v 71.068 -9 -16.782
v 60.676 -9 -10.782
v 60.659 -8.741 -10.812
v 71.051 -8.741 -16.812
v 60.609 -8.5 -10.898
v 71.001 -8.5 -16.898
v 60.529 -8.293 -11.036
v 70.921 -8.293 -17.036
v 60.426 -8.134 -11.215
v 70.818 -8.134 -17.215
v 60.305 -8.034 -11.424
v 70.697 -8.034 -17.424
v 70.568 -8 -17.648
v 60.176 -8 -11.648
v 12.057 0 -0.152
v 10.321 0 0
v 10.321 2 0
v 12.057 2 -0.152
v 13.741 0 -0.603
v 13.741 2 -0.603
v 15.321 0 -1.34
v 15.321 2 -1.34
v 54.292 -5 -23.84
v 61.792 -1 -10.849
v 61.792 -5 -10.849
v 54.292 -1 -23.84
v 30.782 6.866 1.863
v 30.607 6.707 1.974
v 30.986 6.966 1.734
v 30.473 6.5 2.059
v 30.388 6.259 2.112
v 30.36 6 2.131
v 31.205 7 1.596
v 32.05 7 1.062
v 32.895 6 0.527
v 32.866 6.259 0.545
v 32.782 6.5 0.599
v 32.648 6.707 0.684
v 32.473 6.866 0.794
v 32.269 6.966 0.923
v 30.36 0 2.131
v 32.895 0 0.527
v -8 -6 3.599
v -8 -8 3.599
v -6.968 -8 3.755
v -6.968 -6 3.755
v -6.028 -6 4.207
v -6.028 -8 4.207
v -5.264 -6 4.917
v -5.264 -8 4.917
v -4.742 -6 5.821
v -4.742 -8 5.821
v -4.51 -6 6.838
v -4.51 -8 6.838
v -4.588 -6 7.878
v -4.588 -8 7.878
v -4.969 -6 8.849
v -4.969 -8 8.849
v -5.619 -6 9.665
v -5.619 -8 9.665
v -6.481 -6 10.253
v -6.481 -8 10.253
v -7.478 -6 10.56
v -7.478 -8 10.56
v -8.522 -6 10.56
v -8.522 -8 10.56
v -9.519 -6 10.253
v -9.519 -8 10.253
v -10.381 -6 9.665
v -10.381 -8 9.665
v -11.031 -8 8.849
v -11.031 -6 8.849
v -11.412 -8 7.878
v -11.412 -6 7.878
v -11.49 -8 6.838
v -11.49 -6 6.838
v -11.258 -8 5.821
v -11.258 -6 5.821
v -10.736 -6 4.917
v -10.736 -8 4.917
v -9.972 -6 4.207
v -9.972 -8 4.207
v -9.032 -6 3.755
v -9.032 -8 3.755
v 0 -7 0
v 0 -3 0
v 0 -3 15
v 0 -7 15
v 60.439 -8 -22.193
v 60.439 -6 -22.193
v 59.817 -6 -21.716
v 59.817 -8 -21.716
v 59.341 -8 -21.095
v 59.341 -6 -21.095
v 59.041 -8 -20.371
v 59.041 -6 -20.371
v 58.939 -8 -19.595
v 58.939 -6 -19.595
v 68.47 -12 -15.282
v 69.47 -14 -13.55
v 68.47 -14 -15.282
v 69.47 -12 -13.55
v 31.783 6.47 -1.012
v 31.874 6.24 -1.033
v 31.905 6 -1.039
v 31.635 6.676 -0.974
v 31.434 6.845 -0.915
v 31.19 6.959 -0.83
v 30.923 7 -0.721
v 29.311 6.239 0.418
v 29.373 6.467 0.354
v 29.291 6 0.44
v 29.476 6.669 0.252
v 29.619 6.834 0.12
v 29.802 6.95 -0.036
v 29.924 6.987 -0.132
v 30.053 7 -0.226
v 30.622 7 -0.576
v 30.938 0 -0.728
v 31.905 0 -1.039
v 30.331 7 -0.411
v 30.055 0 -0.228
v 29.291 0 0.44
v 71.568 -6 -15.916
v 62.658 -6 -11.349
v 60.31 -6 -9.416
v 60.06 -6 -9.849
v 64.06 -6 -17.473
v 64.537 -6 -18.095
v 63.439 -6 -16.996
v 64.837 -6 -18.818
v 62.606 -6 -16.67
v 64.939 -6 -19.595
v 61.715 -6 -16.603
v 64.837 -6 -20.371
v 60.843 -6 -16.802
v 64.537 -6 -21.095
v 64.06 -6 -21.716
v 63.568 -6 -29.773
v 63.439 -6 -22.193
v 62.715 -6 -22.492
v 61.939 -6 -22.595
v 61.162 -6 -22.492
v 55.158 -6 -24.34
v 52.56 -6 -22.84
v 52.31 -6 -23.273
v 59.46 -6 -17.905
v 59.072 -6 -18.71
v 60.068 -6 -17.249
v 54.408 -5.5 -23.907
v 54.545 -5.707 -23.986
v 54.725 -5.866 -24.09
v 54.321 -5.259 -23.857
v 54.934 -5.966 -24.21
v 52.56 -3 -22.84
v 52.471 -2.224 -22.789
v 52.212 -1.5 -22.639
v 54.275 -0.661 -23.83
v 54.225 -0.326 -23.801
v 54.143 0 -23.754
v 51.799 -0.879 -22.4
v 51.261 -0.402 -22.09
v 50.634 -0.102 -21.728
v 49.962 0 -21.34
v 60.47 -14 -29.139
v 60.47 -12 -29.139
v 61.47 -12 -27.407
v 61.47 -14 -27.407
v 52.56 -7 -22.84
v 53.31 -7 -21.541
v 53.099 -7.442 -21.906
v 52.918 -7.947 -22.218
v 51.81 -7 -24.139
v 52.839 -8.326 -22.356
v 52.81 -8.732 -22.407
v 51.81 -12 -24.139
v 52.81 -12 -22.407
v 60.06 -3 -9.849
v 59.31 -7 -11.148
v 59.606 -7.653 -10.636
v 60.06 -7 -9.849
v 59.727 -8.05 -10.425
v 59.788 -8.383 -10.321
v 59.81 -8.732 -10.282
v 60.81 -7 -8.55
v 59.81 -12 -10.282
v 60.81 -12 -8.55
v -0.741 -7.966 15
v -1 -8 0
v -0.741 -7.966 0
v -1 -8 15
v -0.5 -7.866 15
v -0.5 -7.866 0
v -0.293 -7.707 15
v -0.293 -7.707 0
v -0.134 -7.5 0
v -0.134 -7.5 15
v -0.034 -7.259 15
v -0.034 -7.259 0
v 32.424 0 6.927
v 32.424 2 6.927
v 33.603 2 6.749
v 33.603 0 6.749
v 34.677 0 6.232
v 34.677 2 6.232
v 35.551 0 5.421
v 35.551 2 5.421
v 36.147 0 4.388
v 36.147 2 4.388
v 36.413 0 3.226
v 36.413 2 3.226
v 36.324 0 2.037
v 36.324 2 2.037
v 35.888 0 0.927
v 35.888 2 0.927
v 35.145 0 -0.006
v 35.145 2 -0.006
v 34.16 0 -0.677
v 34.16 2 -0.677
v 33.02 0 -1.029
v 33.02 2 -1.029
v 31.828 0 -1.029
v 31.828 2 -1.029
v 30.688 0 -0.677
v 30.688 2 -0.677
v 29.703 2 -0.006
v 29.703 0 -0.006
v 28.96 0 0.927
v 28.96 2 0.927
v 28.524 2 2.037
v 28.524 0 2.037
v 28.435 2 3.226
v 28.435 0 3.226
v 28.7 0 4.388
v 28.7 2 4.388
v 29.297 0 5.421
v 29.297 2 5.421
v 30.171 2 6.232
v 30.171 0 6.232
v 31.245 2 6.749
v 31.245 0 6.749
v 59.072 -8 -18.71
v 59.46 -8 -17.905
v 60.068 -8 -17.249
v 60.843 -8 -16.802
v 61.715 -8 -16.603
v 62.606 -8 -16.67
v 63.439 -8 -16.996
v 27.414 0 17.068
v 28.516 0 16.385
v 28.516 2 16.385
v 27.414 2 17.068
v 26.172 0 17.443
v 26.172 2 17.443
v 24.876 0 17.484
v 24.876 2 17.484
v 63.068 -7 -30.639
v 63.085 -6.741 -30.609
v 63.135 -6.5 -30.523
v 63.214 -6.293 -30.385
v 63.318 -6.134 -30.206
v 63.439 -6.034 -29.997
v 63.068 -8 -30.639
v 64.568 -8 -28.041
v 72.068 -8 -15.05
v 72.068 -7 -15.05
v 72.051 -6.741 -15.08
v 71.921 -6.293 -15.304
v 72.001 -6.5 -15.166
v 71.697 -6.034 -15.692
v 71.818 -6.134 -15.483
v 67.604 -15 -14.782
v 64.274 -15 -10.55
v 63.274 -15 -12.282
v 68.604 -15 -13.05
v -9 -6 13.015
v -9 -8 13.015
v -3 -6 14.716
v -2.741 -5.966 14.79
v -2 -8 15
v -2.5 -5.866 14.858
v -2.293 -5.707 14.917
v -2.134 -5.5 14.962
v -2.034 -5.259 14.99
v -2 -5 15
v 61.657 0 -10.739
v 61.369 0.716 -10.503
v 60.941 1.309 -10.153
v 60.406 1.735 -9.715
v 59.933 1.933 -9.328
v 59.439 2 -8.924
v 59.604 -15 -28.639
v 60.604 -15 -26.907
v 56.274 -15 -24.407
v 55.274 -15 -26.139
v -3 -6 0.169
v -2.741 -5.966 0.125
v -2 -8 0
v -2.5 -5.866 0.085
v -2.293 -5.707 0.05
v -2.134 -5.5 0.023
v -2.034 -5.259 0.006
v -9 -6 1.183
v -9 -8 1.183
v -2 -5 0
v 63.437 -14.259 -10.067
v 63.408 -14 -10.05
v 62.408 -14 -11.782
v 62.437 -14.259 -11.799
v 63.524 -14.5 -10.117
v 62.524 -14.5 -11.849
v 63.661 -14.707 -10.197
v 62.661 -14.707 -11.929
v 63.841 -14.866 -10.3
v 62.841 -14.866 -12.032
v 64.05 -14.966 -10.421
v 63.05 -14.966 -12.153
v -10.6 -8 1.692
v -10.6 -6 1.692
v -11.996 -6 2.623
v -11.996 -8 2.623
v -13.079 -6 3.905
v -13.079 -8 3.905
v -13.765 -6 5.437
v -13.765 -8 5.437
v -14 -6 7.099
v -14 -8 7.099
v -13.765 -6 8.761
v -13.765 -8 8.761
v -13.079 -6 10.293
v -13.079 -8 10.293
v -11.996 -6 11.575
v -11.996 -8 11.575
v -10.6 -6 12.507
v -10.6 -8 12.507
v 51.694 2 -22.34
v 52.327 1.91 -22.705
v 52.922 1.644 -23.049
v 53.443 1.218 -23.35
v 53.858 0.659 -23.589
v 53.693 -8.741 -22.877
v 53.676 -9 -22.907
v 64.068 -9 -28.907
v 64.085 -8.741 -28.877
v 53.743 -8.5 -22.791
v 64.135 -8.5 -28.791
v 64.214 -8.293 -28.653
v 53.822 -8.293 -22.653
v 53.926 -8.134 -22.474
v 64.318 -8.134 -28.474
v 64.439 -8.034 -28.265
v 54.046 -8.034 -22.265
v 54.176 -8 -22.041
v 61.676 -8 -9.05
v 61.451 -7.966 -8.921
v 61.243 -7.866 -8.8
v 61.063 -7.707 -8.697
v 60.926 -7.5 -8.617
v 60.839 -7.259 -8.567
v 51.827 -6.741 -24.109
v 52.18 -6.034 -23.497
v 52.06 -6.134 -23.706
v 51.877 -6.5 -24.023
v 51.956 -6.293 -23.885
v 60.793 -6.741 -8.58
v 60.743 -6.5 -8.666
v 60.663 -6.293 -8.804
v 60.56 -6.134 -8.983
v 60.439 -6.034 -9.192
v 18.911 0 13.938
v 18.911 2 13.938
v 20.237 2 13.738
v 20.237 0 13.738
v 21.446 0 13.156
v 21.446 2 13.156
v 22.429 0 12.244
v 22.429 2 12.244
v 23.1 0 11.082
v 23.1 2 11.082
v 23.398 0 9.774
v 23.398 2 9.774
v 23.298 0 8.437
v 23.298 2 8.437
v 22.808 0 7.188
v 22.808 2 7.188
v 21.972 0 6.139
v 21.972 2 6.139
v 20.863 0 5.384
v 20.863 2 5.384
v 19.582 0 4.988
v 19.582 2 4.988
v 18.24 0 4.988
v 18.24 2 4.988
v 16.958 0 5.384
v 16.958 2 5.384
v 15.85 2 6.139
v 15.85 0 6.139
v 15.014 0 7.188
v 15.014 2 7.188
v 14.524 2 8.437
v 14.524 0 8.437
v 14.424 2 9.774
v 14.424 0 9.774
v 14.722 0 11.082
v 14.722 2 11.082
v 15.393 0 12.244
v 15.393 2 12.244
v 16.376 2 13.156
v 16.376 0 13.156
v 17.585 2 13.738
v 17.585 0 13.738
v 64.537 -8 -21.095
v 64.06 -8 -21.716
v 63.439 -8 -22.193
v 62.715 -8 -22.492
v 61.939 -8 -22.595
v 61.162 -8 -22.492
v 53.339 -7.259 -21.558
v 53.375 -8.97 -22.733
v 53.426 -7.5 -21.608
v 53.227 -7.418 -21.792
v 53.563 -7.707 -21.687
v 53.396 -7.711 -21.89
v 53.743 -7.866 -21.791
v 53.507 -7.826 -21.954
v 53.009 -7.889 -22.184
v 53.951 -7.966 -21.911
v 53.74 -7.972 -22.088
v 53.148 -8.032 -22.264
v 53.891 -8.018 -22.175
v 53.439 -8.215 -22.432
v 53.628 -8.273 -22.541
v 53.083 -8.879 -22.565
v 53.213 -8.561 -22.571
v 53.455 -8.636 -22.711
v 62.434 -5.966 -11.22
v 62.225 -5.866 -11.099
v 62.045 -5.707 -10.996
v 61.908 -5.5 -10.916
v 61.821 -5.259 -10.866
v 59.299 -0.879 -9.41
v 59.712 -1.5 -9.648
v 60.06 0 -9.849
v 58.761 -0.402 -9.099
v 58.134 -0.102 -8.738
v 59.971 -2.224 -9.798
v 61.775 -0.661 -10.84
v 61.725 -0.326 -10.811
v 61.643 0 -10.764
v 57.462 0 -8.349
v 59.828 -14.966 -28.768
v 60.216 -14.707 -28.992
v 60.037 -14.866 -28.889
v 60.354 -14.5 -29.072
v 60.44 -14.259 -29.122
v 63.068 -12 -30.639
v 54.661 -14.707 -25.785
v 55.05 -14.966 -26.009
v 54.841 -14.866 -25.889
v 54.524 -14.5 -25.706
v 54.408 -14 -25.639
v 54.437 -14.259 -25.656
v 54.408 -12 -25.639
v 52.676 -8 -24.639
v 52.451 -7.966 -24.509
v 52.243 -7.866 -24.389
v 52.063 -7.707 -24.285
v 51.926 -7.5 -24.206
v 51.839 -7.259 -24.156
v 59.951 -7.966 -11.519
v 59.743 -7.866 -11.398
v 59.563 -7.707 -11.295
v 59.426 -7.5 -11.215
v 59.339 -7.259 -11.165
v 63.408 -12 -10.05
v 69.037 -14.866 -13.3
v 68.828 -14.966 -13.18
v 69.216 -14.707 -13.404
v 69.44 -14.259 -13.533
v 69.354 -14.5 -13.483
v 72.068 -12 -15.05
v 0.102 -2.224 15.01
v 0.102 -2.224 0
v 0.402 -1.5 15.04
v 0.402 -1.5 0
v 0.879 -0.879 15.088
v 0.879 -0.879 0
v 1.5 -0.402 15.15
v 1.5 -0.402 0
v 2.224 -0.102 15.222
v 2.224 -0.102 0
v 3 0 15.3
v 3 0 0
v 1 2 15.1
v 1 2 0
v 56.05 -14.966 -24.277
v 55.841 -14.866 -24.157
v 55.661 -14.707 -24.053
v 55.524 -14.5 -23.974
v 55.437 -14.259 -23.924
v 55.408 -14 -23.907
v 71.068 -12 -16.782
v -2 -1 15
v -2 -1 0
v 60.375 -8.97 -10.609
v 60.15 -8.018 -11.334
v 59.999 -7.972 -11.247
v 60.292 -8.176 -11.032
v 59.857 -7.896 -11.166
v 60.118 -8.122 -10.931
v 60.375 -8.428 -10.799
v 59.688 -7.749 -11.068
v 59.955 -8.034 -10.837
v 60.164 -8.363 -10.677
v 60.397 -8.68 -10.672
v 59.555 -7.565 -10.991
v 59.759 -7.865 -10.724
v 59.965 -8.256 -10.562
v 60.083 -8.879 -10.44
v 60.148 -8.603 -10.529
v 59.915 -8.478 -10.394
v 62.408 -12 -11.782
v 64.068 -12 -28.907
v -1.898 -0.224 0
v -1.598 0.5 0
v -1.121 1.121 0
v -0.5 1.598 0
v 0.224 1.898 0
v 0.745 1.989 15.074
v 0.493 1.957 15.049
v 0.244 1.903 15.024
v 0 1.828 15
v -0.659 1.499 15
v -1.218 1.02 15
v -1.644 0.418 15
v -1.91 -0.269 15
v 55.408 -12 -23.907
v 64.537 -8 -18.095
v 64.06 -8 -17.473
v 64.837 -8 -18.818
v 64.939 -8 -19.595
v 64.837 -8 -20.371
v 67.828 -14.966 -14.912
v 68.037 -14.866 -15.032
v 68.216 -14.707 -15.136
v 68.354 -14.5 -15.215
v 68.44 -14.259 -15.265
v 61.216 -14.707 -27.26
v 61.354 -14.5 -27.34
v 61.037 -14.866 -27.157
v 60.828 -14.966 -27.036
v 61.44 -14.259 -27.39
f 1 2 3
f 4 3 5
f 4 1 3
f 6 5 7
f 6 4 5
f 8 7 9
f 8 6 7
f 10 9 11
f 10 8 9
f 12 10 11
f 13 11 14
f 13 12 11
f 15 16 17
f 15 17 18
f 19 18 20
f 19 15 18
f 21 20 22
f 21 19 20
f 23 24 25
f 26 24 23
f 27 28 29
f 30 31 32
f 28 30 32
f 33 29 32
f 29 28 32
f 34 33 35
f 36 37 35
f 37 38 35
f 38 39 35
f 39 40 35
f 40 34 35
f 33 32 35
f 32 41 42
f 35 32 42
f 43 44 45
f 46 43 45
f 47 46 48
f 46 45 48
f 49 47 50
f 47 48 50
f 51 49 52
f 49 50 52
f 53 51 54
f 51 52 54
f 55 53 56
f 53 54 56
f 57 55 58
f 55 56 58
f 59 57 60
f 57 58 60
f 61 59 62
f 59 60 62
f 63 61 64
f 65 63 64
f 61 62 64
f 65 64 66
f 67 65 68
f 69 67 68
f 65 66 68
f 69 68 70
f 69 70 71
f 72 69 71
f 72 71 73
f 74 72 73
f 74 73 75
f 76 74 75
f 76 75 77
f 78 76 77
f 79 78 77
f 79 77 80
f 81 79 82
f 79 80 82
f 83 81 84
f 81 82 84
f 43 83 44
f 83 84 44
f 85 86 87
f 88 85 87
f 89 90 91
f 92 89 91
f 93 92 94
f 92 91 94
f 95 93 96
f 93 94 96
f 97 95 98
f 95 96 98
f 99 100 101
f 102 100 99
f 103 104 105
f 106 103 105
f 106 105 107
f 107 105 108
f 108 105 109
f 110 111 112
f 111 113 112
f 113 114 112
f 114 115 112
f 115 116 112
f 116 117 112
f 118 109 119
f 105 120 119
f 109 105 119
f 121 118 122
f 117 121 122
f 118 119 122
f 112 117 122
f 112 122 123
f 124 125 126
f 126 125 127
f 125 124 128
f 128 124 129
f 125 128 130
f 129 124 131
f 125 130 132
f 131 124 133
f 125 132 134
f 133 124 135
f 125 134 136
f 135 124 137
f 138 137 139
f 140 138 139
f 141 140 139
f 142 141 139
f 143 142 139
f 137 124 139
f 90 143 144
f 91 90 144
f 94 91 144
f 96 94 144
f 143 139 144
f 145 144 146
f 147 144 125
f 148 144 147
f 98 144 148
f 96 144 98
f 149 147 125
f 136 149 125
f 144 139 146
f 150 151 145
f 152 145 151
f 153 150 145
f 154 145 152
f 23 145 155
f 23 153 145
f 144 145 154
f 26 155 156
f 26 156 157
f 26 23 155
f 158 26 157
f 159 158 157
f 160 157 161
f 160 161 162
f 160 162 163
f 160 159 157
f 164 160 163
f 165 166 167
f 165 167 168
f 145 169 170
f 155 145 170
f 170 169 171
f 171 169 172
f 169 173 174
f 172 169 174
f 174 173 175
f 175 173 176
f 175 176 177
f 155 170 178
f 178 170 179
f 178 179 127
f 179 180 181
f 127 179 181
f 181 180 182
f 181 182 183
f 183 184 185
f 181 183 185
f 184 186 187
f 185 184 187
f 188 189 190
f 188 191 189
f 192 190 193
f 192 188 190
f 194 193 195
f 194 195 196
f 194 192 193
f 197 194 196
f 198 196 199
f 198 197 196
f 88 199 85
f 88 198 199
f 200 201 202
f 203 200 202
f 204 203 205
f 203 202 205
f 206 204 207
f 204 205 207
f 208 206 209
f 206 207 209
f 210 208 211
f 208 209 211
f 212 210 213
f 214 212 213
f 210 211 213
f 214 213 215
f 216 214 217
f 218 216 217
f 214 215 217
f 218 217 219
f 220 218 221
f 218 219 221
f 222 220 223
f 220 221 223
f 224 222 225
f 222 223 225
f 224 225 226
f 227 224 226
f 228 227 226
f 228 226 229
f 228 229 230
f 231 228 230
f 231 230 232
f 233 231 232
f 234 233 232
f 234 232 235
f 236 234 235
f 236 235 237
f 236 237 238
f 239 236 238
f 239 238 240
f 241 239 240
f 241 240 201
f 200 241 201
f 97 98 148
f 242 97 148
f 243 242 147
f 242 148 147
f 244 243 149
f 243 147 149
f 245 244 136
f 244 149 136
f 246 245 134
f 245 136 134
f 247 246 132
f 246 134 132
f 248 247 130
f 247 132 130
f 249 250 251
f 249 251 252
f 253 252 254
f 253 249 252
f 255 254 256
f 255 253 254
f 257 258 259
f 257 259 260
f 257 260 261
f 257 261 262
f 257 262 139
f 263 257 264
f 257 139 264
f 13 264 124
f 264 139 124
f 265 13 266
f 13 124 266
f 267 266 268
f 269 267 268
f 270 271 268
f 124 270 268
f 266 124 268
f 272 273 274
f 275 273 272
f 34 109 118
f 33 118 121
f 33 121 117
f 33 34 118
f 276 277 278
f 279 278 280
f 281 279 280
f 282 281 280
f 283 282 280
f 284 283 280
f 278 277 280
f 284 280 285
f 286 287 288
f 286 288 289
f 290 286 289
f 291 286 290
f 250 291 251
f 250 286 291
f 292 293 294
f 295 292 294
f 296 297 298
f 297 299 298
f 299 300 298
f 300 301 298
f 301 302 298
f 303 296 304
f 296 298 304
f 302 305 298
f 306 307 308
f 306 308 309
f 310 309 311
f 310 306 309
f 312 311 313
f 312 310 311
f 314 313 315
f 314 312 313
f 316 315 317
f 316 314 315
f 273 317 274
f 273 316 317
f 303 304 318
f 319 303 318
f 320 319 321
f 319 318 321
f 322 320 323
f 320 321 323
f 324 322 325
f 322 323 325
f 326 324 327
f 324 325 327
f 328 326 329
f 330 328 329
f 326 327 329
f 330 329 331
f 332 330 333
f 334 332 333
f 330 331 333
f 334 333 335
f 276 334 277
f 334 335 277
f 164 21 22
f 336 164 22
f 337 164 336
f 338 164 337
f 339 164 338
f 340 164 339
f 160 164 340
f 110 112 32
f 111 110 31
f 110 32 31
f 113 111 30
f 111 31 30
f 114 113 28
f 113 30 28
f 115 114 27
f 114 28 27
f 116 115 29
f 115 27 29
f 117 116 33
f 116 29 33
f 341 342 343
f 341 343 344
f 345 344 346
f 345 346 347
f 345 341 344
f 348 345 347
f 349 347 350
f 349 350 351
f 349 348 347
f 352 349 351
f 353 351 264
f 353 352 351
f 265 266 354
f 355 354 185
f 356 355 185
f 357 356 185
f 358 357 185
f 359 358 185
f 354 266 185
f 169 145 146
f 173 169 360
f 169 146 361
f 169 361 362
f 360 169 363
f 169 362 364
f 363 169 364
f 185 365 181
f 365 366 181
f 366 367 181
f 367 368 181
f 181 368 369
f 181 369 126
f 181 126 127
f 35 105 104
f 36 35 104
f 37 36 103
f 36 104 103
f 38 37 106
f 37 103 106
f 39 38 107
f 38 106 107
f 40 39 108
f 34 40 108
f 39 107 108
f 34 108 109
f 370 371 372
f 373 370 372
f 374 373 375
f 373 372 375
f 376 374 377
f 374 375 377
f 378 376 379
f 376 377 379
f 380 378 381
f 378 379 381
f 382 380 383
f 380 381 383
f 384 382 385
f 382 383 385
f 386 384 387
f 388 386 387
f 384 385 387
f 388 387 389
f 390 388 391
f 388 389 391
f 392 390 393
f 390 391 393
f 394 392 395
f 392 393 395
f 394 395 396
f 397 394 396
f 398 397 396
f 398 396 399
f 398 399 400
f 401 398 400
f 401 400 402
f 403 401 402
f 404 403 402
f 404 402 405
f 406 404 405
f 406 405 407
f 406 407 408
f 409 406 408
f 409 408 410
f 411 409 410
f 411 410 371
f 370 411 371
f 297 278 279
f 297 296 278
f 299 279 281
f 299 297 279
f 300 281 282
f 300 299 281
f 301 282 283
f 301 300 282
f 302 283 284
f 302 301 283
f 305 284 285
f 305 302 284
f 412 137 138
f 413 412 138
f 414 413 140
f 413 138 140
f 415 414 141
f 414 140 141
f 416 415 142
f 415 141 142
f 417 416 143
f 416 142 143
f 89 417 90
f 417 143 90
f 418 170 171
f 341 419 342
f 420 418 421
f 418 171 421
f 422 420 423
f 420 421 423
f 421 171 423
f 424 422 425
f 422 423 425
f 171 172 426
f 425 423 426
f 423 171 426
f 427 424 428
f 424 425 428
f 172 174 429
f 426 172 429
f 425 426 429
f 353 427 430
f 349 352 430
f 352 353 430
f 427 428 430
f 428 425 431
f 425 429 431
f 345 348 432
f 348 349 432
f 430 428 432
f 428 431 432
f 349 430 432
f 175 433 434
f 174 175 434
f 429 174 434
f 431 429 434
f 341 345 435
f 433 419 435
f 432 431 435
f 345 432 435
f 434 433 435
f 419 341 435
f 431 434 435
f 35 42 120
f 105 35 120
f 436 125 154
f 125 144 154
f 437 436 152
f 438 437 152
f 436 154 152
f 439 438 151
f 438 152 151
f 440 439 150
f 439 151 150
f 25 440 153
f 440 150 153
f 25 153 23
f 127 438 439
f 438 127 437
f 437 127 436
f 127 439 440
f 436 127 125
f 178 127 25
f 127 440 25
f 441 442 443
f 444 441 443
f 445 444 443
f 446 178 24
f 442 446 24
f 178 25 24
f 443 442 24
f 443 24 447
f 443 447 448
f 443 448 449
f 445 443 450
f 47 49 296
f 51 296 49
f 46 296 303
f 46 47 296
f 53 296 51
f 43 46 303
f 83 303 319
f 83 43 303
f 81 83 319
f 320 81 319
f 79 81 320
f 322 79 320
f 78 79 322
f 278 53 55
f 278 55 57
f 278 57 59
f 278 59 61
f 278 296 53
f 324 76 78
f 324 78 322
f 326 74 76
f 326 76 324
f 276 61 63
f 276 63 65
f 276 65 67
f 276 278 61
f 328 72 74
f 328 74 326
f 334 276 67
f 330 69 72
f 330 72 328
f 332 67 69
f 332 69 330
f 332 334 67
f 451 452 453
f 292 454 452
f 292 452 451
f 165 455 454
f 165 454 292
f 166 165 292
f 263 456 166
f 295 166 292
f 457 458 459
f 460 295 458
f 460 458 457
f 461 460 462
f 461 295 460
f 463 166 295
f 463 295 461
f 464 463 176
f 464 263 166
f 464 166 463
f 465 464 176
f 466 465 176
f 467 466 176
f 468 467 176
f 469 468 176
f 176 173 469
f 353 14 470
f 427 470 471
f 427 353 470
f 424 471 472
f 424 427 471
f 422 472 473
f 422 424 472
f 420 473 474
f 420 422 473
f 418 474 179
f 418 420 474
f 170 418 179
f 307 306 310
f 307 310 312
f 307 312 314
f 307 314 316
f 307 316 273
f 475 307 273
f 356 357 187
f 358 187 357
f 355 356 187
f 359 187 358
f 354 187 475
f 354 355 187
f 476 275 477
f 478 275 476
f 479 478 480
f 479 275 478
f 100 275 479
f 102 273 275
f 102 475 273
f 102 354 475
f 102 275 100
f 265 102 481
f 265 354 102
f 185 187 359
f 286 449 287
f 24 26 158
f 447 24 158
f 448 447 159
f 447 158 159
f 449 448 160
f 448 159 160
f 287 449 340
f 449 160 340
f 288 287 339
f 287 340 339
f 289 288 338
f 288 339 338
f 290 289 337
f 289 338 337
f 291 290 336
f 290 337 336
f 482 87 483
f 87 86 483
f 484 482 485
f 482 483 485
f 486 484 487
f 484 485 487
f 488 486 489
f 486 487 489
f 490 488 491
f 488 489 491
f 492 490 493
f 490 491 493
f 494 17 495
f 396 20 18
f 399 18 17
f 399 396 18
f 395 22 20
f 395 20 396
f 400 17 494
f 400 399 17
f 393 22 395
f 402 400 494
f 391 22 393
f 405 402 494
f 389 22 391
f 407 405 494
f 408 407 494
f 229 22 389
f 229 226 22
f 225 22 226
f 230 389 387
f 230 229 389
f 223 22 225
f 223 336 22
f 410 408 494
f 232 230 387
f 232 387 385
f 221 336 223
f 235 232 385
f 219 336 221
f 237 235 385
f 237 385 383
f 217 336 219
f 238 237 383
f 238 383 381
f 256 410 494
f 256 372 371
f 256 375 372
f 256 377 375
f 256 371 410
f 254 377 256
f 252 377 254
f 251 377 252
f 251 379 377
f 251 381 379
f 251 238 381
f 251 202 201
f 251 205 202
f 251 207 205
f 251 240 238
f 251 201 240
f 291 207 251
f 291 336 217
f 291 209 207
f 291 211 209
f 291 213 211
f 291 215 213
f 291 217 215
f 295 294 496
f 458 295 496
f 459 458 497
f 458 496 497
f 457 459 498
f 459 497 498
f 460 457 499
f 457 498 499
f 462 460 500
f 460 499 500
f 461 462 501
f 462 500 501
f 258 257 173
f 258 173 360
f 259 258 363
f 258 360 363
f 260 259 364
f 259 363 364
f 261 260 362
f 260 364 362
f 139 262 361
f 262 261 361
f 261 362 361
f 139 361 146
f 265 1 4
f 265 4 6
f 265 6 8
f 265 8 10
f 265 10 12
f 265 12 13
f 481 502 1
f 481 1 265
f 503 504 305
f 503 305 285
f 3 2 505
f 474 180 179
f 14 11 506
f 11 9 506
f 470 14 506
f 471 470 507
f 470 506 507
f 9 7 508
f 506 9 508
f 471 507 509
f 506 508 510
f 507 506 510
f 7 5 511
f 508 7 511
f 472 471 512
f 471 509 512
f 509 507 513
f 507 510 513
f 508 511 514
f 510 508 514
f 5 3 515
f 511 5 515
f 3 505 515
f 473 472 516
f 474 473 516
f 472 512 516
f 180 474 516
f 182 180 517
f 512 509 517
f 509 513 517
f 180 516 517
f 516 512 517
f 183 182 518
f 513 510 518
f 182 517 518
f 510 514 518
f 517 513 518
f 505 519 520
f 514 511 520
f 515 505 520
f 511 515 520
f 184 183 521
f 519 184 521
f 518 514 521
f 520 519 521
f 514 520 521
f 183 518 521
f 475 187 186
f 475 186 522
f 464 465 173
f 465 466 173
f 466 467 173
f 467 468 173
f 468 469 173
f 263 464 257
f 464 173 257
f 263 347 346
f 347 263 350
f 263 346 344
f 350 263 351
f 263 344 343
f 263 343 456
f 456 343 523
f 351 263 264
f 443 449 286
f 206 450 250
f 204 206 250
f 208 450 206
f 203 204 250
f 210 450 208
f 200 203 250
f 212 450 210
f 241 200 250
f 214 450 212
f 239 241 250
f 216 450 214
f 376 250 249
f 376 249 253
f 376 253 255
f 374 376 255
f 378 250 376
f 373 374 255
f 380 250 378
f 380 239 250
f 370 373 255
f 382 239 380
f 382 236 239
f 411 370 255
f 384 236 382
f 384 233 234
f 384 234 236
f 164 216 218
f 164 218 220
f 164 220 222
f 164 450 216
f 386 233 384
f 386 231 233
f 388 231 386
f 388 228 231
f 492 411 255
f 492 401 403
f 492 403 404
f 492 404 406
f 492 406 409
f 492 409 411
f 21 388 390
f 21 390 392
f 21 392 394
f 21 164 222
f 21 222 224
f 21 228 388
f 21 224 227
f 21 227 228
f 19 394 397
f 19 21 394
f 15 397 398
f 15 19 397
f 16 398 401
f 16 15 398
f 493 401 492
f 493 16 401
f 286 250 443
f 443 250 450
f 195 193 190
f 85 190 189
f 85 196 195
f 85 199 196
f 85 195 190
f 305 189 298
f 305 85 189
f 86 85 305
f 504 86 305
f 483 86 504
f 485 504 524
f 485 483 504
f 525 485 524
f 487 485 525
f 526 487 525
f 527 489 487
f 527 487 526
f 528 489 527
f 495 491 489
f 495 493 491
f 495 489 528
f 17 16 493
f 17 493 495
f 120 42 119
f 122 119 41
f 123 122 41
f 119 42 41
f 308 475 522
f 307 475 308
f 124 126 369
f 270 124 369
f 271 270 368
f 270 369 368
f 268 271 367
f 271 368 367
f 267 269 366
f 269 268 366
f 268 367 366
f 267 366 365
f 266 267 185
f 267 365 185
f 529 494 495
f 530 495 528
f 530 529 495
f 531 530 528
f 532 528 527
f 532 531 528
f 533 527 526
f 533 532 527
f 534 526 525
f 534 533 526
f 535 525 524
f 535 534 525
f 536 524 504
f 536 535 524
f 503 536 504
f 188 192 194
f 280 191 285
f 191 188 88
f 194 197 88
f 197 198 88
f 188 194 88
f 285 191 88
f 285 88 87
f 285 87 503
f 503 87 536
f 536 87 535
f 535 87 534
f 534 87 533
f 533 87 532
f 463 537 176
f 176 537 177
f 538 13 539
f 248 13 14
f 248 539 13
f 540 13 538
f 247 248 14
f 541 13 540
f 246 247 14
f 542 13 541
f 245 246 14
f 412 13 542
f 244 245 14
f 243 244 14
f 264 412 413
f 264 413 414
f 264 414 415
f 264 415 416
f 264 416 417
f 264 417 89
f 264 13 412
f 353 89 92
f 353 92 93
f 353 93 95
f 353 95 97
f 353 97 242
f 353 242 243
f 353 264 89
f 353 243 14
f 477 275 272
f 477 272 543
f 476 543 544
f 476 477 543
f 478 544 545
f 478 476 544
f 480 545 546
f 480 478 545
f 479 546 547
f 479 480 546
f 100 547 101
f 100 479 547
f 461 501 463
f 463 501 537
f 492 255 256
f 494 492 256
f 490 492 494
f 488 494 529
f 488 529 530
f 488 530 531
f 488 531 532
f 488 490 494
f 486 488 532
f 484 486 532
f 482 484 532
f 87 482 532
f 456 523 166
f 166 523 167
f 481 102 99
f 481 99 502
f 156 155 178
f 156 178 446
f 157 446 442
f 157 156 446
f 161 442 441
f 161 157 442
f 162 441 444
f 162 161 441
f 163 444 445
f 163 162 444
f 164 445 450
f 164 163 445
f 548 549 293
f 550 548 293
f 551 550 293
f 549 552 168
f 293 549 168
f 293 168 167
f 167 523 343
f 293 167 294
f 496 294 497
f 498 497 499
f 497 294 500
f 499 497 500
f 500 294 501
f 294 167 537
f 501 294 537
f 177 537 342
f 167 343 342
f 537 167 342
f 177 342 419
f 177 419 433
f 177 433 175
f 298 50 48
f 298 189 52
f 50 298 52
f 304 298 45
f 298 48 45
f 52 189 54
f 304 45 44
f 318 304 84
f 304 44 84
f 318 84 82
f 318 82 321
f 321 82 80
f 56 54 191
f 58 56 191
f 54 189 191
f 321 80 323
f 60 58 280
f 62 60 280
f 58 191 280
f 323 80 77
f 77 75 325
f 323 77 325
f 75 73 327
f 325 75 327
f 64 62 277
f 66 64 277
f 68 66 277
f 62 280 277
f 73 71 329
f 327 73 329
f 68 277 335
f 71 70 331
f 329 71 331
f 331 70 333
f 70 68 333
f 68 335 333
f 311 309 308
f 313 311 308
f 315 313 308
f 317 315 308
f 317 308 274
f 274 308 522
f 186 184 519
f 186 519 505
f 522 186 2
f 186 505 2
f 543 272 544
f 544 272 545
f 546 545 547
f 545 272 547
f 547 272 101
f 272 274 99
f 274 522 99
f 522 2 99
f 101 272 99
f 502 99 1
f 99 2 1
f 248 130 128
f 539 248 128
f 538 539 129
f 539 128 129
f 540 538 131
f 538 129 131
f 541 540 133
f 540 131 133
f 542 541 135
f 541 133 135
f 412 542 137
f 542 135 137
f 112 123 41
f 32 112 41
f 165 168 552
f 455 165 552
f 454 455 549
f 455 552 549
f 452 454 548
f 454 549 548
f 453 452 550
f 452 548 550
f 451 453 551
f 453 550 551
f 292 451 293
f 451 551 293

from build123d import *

# Parameters (mm, degrees)
BOSS_EXTRUDE1_DEPTH = 2
SKETCH3_W           = 15
SKETCH3_H           = 8
BOSS_EXTRUDE2_DEPTH = 2
FILLET2_R           = 3
BOSS_EXTRUDE4_DEPTH = 2
FILLET3_R           = 1
BOSS_EXTRUDE5_DEPTH = 2
BOSS_EXTRUDE6_START = -2
BOSS_EXTRUDE6_DEPTH = 2
FILLET5_R           = 1
SKETCH8_W           = 15
SKETCH8_H           = 10
BOSS_EXTRUDE7_DEPTH = 2
FILLET6_R           = 3
SKETCH9_R           = 3.5
BOSS_EXTRUDE8_DEPTH = 2
FILLET7_R           = 1
SKETCH12_R          = 4.5
SKETCH12_R_2        = 4
CUT_EXTRUDE1_DEPTH  = 10
BOSS_EXTRUDE9_DEPTH = 7
FILLET9_R           = 1


with BuildPart() as part:
    # Sketch2 → Boss-Extrude1 (new body)
    with BuildSketch(Plane(origin=(0, 0, 0), x_dir=(1, 0, 0), z_dir=(0, 1, 0))):
        with BuildLine():
            Line((0, 0), (10.320508076, 0))
            ThreePointArc((10.320508076, 0), (12.908698527, 0.340741737), (15.320508076, 1.339745962))
            Line((15.320508076, 1.339745962), (54.291651246, 23.839745962))
            Line((54.291651246, 23.839745962), (61.791651246, 10.849364905))
            Line((61.791651246, 10.849364905), (28.515723989, -16.385037331))
            ThreePointArc((28.515723989, -16.385037331), (26.805291295, -17.296341677), (24.876316463, -17.483722855))
            Line((24.876316463, -17.483722855), (0, -15))
            Line((0, -15), (0, 0))
        make_face()
    extrude(amount=BOSS_EXTRUDE1_DEPTH)

    # Sketch3 → Boss-Extrude2 (add)
    with BuildSketch(Plane(origin=(51.041651246, 0, -29.468911087), x_dir=(-0.5000000000000027, 0, -0.8660254037844372), z_dir=(0.8660254037844372, 0, -0.5000000000000027))):
        with Locations((-14, -4)):
            Rectangle(SKETCH3_W, SKETCH3_H)
    extrude(amount=-BOSS_EXTRUDE2_DEPTH)

    # Fillet2
    # the kernel refuses this fillet: 3 mm, written as the material it adds along each edge
    with BuildSketch(Plane(origin=(52.559600438, 0, -22.839745962), x_dir=(0, -1, 0), z_dir=(0.5000000000000027, 0, 0.8660254037844372))) as fillet2_piece_1:
        with BuildLine():
            CenterArc((FILLET2_R, -FILLET2_R), FILLET2_R, 90, 90)
            Line((0, -FILLET2_R), (0, 0))
            Line((0, 0), (FILLET2_R, 0))
        make_face()
    extrude(amount=15)
    # the kernel refuses this fillet: 3 mm, written as the material it takes off along each edge
    with BuildSketch(Plane(origin=(50.541651246, 2, -30.334936491), x_dir=(-0.866025403784437, 0, 0.5000000000000028), z_dir=(0.5000000000000028, 0, 0.866025403784437))) as fillet2_2_piece_1:
        with BuildLine():
            CenterArc((FILLET2_R, FILLET2_R), FILLET2_R, 180, 90)
            Line((0, FILLET2_R), (0, 0))
            Line((0, 0), (FILLET2_R, 0))
        make_face()
    extrude(amount=30, mode=Mode.SUBTRACT)

    # Sketch5 → Boss-Extrude4 (add)
    with BuildSketch(Plane(origin=(0, -6, 0), x_dir=(-1, 0, 0), z_dir=(0, -1, 0))):
        with BuildLine():
            Line((-63.067930688, 30.638784068), (-67.567930688, 22.844555434))
            Line((-67.567930688, 22.844555434), (-64.536841774, 21.094555434))
            ThreePointArc((-64.536841774, 21.094555434), (-62.715222698, 22.492332913), (-60.438765563, 22.192631645))
            Line((-60.438765563, 22.192631645), (-57.438765563, 27.388784068))
            Line((-57.438765563, 27.388784068), (-63.067930688, 30.638784068))
        make_face()
        with BuildLine():
            Line((-66.438765563, 11.8003268), (-60.809600438, 8.5503268))
            Line((-60.809600438, 8.5503268), (-60.059600438, 9.849364905))
            Line((-60.059600438, 9.849364905), (-52.559600438, 22.839745962))
            Line((-52.559600438, 22.839745962), (-51.809600438, 24.138784068))
            Line((-51.809600438, 24.138784068), (-57.438765563, 27.388784068))
            Line((-57.438765563, 27.388784068), (-60.438765563, 22.192631645))
            ThreePointArc((-60.438765563, 22.192631645), (-59.340689352, 21.094555434), (-58.938765563, 19.594555434))
            ThreePointArc((-58.938765563, 19.594555434), (-60.438765563, 16.996479222), (-63.438765563, 16.996479222))
            Line((-63.438765563, 16.996479222), (-66.438765563, 11.8003268))
        make_face()
        with BuildLine():
            Line((-72.067930688, 15.0503268), (-66.438765563, 11.8003268))
            Line((-66.438765563, 11.8003268), (-63.438765563, 16.996479222))
            ThreePointArc((-63.438765563, 16.996479222), (-64.836543042, 18.818098298), (-64.536841774, 21.094555434))
            Line((-64.536841774, 21.094555434), (-67.567930688, 22.844555434))
            Line((-67.567930688, 22.844555434), (-72.067930688, 15.0503268))
        make_face()
    extrude(amount=BOSS_EXTRUDE4_DEPTH)

    # Fillet3
    fillet3_edges = [part.edges().sort_by_distance(p)[0] for p in [
        (56.309600438, -8, -16.344555434),
        (58.041651246, -6, -17.344555434),
    ]]
    fillet(fillet3_edges, radius=FILLET3_R)

    # Sketch6 → Boss-Extrude5 (add)
    with BuildSketch(Plane(origin=(11.5, 0, 19.918584287), x_dir=(0.8660254037844387, 0, -0.4999999999999999), z_dir=(0.4999999999999999, 0, 0.8660254037844387))):
        with BuildLine():
            ThreePointArc((57.937822174, -8), (57.230715392, -7.707106781), (56.937822174, -7))
            Line((56.937822174, -7), (56.937822174, -12))
            Line((56.937822174, -12), (59.937822174, -12))
            Line((59.937822174, -12), (59.937822174, -14))
            ThreePointArc((59.937822174, -14), (60.230715392, -14.707106781), (60.937822174, -15))
            Line((60.937822174, -15), (65.937822174, -15))
            ThreePointArc((65.937822174, -15), (66.644928955, -14.707106781), (66.937822174, -14))
            Line((66.937822174, -14), (66.937822174, -12))
            Line((66.937822174, -12), (69.937822174, -12))
            Line((69.937822174, -12), (69.937822174, -8))
            Line((69.937822174, -8), (57.937822174, -8))
        make_face()
    extrude(amount=-BOSS_EXTRUDE5_DEPTH)

    # Sketch7 → Boss-Extrude6 (add)
    with BuildSketch(Plane(origin=(2.5, 0, 4.330127019), x_dir=(-0.8660254037844396, 0, 0.49999999999999856), z_dir=(-0.49999999999999856, 0, -0.8660254037844396)).offset(BOSS_EXTRUDE6_START)):
        with BuildLine():
            Line((-65.937822174, -15), (-60.937822174, -15))
            ThreePointArc((-60.937822174, -15), (-60.230715392, -14.707106781), (-59.937822174, -14))
            Line((-59.937822174, -14), (-59.937822174, -12))
            Line((-59.937822174, -12), (-56.937822174, -12))
            Line((-56.937822174, -12), (-56.937822174, -7))
            ThreePointArc((-56.937822174, -7), (-57.230715392, -7.707106781), (-57.937822174, -8))
            Line((-57.937822174, -8), (-69.937822174, -8))
            Line((-69.937822174, -8), (-69.937822174, -12))
            Line((-69.937822174, -12), (-66.937822174, -12))
            Line((-66.937822174, -12), (-66.937822174, -14))
            ThreePointArc((-66.937822174, -14), (-66.644928955, -14.707106781), (-65.937822174, -15))
        make_face()
    extrude(amount=BOSS_EXTRUDE6_DEPTH)

    # Fillet5
    # the kernel refuses this fillet: 1 mm, written as the material it adds along each edge
    with BuildSketch(Plane(origin=(60.675625842, -7, -10.782377607), x_dir=(0, -1, 0), z_dir=(0.8660254037844387, -1.4083318032254873e-14, -0.4999999999999999))) as fillet5_piece_1_section:
        with BuildLine():
            CenterArc((1 + FILLET5_R, FILLET5_R), FILLET5_R, 180, 90)
            Line((1 + FILLET5_R, 0), (1, 0))
            Line((1, 0), (1, FILLET5_R))
        make_face()
    fillet5_piece_1 = revolve(axis=Axis((60.675625842, -7, -10.782377607), (-0.4999999999999999, 0, -0.8660254037844387)), revolution_arc=233.296989237, mode=Mode.PRIVATE)
    fillet5_piece_1 = split(fillet5_piece_1, bisect_by=Plane(origin=(59.653786466, -7.749939066, -10.552255325), z_dir=(0.8660254037844372, 0, -0.5000000000000027)), keep=Keep.TOP, mode=Mode.PRIVATE)
    fillet5_piece_1 = fillet5_piece_1 - Plane(origin=(62.251862677, -5, -12.052255325), x_dir=(-0.866025403784437, 0, 0.5000000000000028), z_dir=(-0.5000000000000028, 0, -0.866025403784437)) * Cylinder(1, 9, mode=Mode.PRIVATE)
    add(fillet5_piece_1)
    with BuildSketch(Plane(origin=(71.067930688, -8, -16.782377607), x_dir=(-0.4999999999999999, -3.552713678800505e-15, -0.8660254037844387), z_dir=(-0.8660254037844387, 0, 0.4999999999999999)), Plane(origin=(53.675625842, -8, -22.90673326), x_dir=(0.49999999999999856, -1.776356839400247e-15, 0.8660254037844395), z_dir=(0.8660254037844396, 0, -0.49999999999999856))) as fillet5_piece_2:
        with BuildLine():
            CenterArc((FILLET5_R, FILLET5_R), FILLET5_R, 180, 90)
            Line((0, FILLET5_R), (0, 0))
            Line((0, 0), (FILLET5_R, 0))
        make_face()
    extrude(amount=12)
    with BuildSketch(Plane(origin=(53.675625842, -7, -22.90673326), x_dir=(0.6943308785696991, 0.5976672776326631, -0.40087211964888625), z_dir=(0.5175950454405738, -0.8017442392977709, -0.29883363881633085))) as fillet5_piece_3_section:
        with BuildLine():
            CenterArc((1 + FILLET5_R, FILLET5_R), FILLET5_R, 180, 90)
            Line((1, FILLET5_R), (1, 0))
            Line((1, 0), (1 + FILLET5_R, 0))
        make_face()
    fillet5_piece_3 = revolve(axis=Axis((53.675625842, -7, -22.90673326), (0.49999999999999856, 0, 0.8660254037844396)), revolution_arc=233.296989237, mode=Mode.PRIVATE)
    fillet5_piece_3 = split(fillet5_piece_3, bisect_by=Plane(origin=(52.965414583, -7.749938757, -22.136855245), z_dir=(0.8660254037844372, 0, -0.5000000000000027)), keep=Keep.TOP, mode=Mode.PRIVATE)
    fillet5_piece_3 = fillet5_piece_3 - Plane(origin=(55.563490794, -5, -23.636855245), x_dir=(-0.866025403784437, 0, 0.5000000000000028), z_dir=(-0.5000000000000028, 0, -0.866025403784437)) * Cylinder(1, 9, mode=Mode.PRIVATE)
    add(fillet5_piece_3)
    # the kernel refuses this fillet: 1 mm, written as the material it takes off along each edge
    with BuildSketch(Plane(origin=(58.644536929, -6, -7.3003268), x_dir=(-0.4999999999999999, 0, -0.8660254037844388), z_dir=(0.8660254037844388, 0, -0.4999999999999999))) as fillet5_2_piece_1:
        with BuildLine():
            CenterArc((FILLET5_R, -FILLET5_R), FILLET5_R, 90, 90)
            Line((0, -FILLET5_R), (0, 0))
            Line((0, 0), (FILLET5_R, 0))
        make_face()
    extrude(amount=18, mode=Mode.SUBTRACT)
    with BuildSketch(Plane(origin=(49.644536929, -6, -22.888784068), x_dir=(0.49999999999999833, 0, 0.8660254037844396), z_dir=(0.8660254037844396, 0, -0.4999999999999983))) as fillet5_2_piece_2:
        with BuildLine():
            CenterArc((FILLET5_R, FILLET5_R), FILLET5_R, 180, 90)
            Line((0, FILLET5_R), (0, 0))
            Line((0, 0), (FILLET5_R, 0))
        make_face()
    extrude(amount=18, mode=Mode.SUBTRACT)

    # Sketch8 → Boss-Extrude7 (add)
    with BuildSketch(Plane.ZY):
        with Locations((7.5, -3)):
            Rectangle(SKETCH8_W, SKETCH8_H)
    extrude(amount=BOSS_EXTRUDE7_DEPTH)

    # Fillet6
    fillet6_edges = [part.edges().sort_by_distance(p)[0] for p in [
        (0, 0, 7.5),
        (-2, 2, 7.5),
    ]]
    fillet(fillet6_edges, radius=FILLET6_R)

    # Sketch9 → Boss-Extrude8 (add)
    with BuildSketch(Plane.XZ.offset(8)):
        with BuildLine():
            Line((-2, 0), (-9, 1.183215957))
            ThreePointArc((-9, 1.183215957), (-14, 7.09929574), (-9, 13.015375523))
            Line((-9, 13.015375523), (-2, 15))
            Line((-2, 15), (-2, 0))
        make_face()
        with Locations(Location((-8, 7.09929574, 0), (0, 0, 270))):
            Circle(SKETCH9_R, mode=Mode.SUBTRACT)
    extrude(amount=-BOSS_EXTRUDE8_DEPTH)

    # Fillet7
    fillet7_edges = [part.edges().sort_by_distance(p)[0] for p in [
        (-2, -6, 7.5),
        (0, -8, 7.5),
    ]]
    fillet(fillet7_edges, radius=FILLET7_R)

    # Sketch12 → Cut-Extrude1 (cut)
    with BuildSketch(Plane(origin=(0, 2, 0), x_dir=(1, 0, 0), z_dir=(0, 1, 0))):
        with Locations(Location((18.910947854, -9.438044762, 0), (0, 0, 270))):
            Circle(SKETCH12_R)
        with Locations(Location((32.42399256, -2.926699067, 0), (0, 0, 270))):
            Circle(SKETCH12_R_2)
    extrude(amount=-CUT_EXTRUDE1_DEPTH, mode=Mode.SUBTRACT)


with BuildPart() as body_2:
    # Sketch11 → Boss-Extrude9 (new body)
    with BuildSketch(Plane.XZ):
        with BuildLine():
            Line((29.29079596, 0.440119275), (30.359652266, 2.13054709))
            Line((30.359652266, 2.13054709), (32.895293988, 0.527262631))
            Line((32.895293988, 0.527262631), (31.904665791, -1.039445119))
            ThreePointArc((31.904665791, -1.039445119), (30.484006019, -0.500574739), (29.29079596, 0.440119275))
        make_face()
    extrude(amount=-BOSS_EXTRUDE9_DEPTH)

    # Fillet9
    fillet9_edges = [body_2.edges().sort_by_distance(p)[0] for p in [
        (29.825224113, 7, 1.285333183),
        (32.399979889, 7, -0.256091244),
    ]]
    fillet(fillet9_edges, radius=FILLET9_R)


solid = Compound([part.part, body_2.part])
